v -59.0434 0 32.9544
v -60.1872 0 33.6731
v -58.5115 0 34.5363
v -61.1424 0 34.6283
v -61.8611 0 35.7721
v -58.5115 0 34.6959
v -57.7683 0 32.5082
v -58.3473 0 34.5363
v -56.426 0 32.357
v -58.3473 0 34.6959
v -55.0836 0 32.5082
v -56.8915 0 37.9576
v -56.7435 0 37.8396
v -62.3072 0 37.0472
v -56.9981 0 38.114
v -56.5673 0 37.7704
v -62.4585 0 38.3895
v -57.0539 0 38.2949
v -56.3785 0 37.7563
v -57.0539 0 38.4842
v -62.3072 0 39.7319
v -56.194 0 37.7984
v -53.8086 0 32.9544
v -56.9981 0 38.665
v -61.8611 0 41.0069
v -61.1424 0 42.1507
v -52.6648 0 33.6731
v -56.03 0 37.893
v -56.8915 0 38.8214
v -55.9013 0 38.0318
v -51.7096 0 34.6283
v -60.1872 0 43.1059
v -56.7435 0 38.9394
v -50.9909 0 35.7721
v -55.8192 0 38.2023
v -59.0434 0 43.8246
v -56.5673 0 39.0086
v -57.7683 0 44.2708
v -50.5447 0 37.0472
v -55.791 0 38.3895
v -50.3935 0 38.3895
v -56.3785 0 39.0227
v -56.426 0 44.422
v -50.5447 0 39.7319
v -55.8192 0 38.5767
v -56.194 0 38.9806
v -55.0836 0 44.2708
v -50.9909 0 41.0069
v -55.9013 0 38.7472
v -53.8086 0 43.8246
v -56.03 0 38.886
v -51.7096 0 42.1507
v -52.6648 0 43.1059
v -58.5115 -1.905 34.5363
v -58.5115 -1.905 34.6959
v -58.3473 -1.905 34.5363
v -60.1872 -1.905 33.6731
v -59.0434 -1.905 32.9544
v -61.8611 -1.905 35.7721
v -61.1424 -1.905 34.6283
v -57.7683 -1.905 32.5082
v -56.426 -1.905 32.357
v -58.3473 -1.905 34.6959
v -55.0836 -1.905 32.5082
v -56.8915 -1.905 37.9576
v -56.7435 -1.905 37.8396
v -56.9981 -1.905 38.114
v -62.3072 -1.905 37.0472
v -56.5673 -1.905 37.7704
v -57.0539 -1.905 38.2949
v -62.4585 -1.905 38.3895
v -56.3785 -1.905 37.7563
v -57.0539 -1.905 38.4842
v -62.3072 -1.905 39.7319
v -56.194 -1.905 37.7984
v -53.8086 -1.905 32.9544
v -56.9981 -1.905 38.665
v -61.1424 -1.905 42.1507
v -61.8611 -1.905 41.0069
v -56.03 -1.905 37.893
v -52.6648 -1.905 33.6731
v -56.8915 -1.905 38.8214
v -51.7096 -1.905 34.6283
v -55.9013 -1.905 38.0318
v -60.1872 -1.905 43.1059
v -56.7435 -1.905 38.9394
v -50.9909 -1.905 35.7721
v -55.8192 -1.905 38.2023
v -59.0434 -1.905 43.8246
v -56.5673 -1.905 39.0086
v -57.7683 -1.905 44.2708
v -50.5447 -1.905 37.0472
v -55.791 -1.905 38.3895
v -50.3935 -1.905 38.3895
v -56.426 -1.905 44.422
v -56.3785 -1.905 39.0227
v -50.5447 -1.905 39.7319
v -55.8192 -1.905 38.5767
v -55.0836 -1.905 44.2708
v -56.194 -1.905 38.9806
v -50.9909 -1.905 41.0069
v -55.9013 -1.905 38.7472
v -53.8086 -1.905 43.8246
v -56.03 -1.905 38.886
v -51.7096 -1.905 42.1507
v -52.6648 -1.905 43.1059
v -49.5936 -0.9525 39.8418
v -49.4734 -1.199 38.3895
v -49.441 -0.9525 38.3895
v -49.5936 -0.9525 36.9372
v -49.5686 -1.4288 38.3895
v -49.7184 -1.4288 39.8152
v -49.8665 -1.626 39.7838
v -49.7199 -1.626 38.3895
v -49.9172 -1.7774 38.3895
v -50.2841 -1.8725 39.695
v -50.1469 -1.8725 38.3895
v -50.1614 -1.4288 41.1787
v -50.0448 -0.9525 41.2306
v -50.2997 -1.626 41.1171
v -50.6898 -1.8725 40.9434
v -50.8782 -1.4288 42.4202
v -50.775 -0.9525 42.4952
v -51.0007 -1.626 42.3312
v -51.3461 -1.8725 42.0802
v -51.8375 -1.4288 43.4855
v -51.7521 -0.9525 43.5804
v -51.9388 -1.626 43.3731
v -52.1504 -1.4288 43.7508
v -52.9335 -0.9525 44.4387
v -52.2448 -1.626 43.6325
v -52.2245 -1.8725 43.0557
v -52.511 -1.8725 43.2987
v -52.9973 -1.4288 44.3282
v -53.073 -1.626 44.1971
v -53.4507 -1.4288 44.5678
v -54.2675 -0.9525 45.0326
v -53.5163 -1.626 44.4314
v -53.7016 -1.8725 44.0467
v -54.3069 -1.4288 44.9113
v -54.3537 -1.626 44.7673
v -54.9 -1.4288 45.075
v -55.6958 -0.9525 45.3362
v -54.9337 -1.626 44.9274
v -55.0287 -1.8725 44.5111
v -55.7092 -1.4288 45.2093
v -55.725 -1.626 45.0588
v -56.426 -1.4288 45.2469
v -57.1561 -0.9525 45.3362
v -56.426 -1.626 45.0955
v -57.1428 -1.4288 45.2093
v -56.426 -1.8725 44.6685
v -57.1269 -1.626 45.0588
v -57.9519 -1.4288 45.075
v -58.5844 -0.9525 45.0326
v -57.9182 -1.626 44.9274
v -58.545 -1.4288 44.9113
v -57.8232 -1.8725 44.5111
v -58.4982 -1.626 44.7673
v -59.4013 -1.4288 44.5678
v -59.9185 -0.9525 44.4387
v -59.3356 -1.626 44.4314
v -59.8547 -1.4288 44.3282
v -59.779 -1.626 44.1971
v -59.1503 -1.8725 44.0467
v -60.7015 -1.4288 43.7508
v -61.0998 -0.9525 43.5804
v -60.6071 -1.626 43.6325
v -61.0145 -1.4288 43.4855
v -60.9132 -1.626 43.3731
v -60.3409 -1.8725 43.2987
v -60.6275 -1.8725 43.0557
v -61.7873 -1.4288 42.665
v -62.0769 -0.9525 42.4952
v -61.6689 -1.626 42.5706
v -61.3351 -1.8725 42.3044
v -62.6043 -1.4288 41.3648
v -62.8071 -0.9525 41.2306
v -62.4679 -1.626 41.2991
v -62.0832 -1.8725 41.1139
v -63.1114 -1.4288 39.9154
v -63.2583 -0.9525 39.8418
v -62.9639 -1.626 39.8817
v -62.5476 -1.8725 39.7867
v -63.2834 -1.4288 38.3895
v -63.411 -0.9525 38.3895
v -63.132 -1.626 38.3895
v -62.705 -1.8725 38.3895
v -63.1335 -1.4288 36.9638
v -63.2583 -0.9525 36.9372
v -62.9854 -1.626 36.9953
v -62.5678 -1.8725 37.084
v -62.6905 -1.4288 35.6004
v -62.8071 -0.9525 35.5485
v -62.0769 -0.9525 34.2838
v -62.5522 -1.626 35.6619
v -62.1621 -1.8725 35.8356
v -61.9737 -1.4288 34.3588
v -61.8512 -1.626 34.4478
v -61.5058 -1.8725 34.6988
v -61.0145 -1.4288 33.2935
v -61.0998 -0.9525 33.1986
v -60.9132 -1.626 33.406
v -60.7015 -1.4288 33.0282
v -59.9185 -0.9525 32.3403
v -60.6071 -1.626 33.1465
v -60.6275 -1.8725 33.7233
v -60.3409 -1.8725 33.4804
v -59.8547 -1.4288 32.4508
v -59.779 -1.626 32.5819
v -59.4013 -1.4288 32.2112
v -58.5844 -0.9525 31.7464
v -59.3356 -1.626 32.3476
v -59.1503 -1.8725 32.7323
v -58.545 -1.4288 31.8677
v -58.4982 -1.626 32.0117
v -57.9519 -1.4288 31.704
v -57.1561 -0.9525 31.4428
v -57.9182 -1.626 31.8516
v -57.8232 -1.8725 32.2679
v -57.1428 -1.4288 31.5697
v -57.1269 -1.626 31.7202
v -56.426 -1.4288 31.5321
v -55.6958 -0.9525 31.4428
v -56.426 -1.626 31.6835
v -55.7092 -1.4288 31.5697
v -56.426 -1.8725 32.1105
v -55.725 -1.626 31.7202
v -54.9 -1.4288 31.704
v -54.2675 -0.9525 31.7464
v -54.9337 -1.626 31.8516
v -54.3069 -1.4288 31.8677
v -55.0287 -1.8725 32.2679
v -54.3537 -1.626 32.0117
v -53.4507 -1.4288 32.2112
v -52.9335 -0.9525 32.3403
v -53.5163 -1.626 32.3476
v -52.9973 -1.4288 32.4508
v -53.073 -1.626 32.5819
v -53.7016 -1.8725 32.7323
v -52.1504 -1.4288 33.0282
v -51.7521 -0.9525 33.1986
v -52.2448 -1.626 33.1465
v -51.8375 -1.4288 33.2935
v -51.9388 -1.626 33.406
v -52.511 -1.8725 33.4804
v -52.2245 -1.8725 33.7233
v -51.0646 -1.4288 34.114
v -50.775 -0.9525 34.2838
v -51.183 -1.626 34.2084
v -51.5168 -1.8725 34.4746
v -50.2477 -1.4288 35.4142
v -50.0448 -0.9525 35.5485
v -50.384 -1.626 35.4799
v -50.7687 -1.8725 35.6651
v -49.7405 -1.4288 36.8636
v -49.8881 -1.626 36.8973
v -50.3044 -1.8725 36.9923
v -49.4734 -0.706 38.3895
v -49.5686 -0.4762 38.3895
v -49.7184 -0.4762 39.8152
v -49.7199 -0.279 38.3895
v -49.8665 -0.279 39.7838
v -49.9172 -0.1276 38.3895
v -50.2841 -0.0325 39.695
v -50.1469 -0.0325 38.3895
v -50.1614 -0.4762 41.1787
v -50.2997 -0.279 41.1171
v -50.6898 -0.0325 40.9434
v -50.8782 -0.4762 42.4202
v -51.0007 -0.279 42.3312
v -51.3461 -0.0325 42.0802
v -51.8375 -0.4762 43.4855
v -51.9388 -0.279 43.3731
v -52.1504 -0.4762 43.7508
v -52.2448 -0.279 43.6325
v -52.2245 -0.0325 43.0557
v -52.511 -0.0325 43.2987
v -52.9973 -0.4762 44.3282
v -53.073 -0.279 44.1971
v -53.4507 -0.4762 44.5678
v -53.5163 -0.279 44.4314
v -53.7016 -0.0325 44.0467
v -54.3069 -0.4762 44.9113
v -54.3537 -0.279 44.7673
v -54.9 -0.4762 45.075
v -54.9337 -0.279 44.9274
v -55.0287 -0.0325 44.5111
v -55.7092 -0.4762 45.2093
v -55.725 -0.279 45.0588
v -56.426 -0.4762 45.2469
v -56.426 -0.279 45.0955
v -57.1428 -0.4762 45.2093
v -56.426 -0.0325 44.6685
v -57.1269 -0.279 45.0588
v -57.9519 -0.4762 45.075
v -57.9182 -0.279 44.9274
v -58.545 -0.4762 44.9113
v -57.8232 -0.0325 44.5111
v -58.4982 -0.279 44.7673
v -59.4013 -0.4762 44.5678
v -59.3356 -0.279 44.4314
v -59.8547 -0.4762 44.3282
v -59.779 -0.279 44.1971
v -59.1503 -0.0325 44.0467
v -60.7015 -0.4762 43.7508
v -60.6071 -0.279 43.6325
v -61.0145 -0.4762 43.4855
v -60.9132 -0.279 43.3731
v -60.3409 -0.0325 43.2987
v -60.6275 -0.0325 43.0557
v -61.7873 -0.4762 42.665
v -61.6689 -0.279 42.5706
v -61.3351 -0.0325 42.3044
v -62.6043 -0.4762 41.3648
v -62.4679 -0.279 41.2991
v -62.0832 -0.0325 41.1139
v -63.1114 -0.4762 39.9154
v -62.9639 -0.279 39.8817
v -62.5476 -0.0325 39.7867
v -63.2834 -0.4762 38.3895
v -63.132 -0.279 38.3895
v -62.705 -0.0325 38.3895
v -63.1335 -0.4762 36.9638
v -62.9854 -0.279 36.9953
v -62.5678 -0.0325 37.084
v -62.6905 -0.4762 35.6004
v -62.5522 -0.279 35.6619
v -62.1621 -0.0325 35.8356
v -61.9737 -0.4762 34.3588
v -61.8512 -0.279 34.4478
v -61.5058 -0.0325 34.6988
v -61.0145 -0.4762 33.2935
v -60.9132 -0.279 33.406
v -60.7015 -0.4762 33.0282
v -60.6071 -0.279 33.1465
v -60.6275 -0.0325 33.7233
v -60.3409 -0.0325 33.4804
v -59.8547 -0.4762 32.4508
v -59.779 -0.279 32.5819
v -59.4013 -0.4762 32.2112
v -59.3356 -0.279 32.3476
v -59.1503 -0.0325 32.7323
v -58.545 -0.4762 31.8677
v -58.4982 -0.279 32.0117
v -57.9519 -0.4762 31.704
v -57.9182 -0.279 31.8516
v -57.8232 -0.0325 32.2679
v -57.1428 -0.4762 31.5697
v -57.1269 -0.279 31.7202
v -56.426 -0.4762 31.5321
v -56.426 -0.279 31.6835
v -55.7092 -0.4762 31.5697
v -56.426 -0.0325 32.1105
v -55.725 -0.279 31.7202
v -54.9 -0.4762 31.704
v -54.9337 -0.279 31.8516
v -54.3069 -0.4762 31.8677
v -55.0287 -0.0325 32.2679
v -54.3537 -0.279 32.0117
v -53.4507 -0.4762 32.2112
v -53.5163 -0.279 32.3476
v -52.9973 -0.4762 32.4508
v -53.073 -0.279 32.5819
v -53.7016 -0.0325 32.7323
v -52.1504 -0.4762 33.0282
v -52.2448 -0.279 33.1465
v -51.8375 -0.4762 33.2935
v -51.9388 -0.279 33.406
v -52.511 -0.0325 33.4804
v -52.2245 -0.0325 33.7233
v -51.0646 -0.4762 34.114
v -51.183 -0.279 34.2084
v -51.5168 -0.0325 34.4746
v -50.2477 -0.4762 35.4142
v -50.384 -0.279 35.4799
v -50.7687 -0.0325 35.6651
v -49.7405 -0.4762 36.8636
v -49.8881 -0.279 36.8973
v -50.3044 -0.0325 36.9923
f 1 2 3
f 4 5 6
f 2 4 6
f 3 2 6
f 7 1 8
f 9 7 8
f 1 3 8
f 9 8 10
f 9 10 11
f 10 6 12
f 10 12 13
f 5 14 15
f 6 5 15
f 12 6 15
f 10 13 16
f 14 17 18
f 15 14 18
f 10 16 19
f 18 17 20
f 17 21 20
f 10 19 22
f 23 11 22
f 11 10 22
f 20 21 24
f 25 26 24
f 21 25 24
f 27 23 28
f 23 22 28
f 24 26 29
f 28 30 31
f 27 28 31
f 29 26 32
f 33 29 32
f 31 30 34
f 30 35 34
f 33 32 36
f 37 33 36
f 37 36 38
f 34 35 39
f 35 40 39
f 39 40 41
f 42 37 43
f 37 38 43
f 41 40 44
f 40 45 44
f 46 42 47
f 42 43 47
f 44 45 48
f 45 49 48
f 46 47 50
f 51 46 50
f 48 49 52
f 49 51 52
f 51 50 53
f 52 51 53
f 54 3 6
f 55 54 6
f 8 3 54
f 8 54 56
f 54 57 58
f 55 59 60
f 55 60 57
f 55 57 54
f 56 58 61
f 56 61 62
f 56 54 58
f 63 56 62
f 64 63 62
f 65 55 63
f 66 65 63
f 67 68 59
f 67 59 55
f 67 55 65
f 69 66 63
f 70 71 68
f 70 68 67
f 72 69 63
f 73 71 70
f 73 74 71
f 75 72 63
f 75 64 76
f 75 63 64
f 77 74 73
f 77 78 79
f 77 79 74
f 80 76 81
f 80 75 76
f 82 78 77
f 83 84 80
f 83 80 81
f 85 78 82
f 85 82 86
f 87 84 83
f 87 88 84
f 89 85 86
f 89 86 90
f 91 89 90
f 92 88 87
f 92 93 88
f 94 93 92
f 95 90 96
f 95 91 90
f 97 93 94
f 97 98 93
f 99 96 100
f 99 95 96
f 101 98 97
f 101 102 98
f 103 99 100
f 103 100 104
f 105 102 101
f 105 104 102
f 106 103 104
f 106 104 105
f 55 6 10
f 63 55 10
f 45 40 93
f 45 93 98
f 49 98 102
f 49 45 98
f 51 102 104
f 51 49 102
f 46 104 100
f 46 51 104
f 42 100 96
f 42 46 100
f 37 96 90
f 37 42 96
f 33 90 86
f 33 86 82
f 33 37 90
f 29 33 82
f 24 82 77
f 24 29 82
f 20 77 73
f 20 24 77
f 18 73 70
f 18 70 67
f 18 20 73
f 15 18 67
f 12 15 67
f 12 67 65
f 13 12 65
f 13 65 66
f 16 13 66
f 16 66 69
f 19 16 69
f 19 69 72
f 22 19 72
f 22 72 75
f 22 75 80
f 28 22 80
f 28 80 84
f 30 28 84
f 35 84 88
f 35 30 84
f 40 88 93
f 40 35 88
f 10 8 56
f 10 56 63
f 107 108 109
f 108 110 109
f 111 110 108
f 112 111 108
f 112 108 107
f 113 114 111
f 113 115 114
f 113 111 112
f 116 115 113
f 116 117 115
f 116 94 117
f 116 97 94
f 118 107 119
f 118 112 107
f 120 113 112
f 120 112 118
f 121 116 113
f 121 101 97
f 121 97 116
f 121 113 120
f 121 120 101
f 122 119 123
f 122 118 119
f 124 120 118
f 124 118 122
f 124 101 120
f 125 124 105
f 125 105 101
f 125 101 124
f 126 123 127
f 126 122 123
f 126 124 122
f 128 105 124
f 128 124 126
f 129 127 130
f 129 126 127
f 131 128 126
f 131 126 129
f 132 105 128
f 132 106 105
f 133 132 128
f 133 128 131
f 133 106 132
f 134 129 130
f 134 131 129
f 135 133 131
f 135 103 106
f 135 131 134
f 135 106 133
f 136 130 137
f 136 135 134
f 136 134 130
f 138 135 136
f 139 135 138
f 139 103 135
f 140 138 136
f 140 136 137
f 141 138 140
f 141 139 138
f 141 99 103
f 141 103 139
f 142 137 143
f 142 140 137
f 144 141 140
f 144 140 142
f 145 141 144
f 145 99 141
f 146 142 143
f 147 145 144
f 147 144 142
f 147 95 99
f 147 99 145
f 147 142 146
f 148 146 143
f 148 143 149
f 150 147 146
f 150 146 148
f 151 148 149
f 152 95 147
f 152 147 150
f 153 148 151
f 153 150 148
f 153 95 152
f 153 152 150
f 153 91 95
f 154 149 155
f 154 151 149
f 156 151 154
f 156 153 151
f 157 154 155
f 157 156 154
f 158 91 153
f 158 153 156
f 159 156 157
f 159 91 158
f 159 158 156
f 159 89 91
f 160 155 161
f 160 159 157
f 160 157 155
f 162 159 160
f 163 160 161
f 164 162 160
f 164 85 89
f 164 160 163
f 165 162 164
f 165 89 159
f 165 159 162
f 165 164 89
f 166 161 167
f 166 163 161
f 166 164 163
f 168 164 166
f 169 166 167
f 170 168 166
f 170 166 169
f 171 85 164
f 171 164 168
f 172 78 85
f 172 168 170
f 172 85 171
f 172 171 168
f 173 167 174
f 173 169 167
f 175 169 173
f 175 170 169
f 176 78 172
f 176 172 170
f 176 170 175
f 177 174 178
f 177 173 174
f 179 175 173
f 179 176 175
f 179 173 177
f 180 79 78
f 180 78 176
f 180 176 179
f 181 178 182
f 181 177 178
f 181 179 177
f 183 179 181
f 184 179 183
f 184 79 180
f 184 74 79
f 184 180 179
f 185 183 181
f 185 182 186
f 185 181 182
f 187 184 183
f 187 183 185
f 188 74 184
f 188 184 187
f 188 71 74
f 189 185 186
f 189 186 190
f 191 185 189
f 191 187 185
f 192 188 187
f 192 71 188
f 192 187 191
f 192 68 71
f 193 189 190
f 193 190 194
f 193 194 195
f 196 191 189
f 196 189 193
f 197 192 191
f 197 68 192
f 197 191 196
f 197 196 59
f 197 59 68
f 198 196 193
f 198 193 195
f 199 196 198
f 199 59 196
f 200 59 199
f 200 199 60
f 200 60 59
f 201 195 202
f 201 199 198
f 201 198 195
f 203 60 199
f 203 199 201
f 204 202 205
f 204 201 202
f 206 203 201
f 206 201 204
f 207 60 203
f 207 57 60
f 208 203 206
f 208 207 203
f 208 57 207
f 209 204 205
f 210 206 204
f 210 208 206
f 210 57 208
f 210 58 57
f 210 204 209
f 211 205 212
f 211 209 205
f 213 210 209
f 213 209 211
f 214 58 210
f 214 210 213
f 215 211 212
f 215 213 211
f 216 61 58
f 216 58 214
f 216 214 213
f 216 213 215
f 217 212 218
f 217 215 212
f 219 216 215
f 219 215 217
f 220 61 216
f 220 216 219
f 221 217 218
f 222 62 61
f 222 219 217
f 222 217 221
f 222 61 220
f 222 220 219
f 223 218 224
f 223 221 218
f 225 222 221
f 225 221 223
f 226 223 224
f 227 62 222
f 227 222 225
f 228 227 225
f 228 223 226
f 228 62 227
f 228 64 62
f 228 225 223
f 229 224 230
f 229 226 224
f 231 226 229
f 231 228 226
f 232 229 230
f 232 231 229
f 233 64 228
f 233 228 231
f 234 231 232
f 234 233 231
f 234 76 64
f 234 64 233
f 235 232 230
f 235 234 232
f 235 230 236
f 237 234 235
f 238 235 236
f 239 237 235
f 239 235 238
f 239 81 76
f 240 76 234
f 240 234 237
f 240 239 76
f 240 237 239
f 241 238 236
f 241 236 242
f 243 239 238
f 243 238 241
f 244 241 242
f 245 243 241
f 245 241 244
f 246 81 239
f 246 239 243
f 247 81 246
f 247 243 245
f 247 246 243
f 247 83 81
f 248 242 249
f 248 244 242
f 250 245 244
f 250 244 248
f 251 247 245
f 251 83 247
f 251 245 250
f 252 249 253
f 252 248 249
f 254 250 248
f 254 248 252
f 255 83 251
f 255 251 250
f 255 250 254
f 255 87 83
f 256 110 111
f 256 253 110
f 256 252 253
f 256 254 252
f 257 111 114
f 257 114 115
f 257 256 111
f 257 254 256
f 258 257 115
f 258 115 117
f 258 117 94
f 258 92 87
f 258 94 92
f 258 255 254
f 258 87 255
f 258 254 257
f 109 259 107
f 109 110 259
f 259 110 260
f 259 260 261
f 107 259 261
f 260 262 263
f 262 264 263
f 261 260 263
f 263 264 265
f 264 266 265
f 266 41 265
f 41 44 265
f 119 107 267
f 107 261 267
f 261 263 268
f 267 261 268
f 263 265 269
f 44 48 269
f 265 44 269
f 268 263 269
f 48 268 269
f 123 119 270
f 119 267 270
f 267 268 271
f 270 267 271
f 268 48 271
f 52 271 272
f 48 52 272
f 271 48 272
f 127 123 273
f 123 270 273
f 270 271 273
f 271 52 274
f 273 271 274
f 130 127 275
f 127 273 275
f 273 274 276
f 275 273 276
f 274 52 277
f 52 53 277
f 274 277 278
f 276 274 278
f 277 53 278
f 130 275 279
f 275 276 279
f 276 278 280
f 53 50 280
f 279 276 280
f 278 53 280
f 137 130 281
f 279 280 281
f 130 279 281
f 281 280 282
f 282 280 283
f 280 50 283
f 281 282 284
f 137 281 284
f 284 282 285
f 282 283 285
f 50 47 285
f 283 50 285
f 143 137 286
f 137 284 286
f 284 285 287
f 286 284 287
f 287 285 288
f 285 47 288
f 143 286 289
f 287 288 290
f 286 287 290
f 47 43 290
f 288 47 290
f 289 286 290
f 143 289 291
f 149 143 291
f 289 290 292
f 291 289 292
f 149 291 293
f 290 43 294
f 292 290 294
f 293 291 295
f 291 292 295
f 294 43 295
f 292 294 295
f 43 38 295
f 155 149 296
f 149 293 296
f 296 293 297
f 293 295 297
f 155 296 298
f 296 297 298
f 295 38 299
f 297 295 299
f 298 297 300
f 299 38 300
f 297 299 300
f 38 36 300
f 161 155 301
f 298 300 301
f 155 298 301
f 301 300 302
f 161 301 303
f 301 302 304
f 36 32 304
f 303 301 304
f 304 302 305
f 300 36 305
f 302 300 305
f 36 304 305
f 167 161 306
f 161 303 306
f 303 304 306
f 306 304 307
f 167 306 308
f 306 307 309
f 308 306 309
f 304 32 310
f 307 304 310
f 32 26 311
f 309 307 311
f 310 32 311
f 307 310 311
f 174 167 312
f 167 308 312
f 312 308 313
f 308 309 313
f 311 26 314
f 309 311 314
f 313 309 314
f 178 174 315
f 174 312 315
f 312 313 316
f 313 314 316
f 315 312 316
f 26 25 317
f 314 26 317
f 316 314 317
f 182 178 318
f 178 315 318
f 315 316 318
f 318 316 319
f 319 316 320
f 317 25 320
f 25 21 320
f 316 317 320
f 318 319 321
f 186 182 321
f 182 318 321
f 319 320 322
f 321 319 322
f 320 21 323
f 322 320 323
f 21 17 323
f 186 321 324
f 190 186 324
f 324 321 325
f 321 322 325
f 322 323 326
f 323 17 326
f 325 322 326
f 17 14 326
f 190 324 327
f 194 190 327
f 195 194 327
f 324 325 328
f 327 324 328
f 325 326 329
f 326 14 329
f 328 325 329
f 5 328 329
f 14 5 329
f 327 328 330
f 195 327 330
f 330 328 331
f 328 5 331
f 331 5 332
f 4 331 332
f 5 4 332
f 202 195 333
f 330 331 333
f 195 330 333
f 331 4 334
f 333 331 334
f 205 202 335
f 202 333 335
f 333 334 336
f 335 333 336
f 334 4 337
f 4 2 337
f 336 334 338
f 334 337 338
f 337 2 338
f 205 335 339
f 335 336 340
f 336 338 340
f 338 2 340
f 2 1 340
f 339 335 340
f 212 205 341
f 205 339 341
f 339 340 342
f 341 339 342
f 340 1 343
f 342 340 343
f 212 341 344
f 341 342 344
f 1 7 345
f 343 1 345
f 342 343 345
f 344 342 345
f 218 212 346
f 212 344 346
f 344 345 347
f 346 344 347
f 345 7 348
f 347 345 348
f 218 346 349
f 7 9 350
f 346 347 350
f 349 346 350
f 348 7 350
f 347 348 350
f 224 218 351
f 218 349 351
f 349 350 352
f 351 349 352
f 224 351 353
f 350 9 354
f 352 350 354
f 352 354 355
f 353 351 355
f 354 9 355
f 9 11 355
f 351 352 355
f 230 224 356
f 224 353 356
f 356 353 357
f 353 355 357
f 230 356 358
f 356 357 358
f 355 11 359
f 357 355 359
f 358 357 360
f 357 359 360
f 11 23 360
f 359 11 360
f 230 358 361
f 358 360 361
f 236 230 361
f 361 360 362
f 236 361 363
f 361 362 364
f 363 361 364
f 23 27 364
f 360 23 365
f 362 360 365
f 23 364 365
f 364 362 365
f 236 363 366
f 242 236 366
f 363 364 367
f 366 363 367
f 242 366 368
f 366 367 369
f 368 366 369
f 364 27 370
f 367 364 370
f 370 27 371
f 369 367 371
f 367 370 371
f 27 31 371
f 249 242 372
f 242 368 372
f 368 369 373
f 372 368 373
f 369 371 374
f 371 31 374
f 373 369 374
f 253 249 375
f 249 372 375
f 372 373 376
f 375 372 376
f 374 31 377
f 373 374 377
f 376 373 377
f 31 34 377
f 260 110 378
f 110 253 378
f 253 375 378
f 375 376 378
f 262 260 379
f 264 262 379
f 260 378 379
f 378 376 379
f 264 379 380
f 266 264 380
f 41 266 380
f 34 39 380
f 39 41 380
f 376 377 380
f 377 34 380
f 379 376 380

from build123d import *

# Parameters (mm, degrees)
F0_R     = 6.985
F0_W     = 0.1642033458
F0_H     = 0.1596324146
F0_R_2   = 0.635
F1_DEPTH = 1.905
F2_R     = 0.95249


# Not quite as in the source:
# - a fillet or chamfer is up to 0.001 mm smaller than in the source, because OpenCascade refuses the exact size


with BuildPart() as f1:
    # F0 (on Front) → F1 (new body)
    with BuildSketch(Plane.XZ):
        with Locations((-56.4259625971, 38.3895114064)):
            Circle(F0_R)
        with Locations((-58.4293603897, 34.6161220223)):
            Rectangle(F0_W, F0_H, mode=Mode.SUBTRACT)
        with Locations((-56.4259625971, 38.3895114064)):
            Circle(F0_R_2, mode=Mode.SUBTRACT)
    extrude(amount=F1_DEPTH)

    # F2 (radius 0.9525 in the source; OpenCascade refuses exactly that, so slightly less here)
    f2_edges = [f1.edges().sort_by_distance(p)[0] for p in [
        (-63.410963, -1.905, 38.389511),
        (-63.410963, 0, 38.389511),
    ]]
    fillet(f2_edges, radius=F2_R)


solid = f1.part
